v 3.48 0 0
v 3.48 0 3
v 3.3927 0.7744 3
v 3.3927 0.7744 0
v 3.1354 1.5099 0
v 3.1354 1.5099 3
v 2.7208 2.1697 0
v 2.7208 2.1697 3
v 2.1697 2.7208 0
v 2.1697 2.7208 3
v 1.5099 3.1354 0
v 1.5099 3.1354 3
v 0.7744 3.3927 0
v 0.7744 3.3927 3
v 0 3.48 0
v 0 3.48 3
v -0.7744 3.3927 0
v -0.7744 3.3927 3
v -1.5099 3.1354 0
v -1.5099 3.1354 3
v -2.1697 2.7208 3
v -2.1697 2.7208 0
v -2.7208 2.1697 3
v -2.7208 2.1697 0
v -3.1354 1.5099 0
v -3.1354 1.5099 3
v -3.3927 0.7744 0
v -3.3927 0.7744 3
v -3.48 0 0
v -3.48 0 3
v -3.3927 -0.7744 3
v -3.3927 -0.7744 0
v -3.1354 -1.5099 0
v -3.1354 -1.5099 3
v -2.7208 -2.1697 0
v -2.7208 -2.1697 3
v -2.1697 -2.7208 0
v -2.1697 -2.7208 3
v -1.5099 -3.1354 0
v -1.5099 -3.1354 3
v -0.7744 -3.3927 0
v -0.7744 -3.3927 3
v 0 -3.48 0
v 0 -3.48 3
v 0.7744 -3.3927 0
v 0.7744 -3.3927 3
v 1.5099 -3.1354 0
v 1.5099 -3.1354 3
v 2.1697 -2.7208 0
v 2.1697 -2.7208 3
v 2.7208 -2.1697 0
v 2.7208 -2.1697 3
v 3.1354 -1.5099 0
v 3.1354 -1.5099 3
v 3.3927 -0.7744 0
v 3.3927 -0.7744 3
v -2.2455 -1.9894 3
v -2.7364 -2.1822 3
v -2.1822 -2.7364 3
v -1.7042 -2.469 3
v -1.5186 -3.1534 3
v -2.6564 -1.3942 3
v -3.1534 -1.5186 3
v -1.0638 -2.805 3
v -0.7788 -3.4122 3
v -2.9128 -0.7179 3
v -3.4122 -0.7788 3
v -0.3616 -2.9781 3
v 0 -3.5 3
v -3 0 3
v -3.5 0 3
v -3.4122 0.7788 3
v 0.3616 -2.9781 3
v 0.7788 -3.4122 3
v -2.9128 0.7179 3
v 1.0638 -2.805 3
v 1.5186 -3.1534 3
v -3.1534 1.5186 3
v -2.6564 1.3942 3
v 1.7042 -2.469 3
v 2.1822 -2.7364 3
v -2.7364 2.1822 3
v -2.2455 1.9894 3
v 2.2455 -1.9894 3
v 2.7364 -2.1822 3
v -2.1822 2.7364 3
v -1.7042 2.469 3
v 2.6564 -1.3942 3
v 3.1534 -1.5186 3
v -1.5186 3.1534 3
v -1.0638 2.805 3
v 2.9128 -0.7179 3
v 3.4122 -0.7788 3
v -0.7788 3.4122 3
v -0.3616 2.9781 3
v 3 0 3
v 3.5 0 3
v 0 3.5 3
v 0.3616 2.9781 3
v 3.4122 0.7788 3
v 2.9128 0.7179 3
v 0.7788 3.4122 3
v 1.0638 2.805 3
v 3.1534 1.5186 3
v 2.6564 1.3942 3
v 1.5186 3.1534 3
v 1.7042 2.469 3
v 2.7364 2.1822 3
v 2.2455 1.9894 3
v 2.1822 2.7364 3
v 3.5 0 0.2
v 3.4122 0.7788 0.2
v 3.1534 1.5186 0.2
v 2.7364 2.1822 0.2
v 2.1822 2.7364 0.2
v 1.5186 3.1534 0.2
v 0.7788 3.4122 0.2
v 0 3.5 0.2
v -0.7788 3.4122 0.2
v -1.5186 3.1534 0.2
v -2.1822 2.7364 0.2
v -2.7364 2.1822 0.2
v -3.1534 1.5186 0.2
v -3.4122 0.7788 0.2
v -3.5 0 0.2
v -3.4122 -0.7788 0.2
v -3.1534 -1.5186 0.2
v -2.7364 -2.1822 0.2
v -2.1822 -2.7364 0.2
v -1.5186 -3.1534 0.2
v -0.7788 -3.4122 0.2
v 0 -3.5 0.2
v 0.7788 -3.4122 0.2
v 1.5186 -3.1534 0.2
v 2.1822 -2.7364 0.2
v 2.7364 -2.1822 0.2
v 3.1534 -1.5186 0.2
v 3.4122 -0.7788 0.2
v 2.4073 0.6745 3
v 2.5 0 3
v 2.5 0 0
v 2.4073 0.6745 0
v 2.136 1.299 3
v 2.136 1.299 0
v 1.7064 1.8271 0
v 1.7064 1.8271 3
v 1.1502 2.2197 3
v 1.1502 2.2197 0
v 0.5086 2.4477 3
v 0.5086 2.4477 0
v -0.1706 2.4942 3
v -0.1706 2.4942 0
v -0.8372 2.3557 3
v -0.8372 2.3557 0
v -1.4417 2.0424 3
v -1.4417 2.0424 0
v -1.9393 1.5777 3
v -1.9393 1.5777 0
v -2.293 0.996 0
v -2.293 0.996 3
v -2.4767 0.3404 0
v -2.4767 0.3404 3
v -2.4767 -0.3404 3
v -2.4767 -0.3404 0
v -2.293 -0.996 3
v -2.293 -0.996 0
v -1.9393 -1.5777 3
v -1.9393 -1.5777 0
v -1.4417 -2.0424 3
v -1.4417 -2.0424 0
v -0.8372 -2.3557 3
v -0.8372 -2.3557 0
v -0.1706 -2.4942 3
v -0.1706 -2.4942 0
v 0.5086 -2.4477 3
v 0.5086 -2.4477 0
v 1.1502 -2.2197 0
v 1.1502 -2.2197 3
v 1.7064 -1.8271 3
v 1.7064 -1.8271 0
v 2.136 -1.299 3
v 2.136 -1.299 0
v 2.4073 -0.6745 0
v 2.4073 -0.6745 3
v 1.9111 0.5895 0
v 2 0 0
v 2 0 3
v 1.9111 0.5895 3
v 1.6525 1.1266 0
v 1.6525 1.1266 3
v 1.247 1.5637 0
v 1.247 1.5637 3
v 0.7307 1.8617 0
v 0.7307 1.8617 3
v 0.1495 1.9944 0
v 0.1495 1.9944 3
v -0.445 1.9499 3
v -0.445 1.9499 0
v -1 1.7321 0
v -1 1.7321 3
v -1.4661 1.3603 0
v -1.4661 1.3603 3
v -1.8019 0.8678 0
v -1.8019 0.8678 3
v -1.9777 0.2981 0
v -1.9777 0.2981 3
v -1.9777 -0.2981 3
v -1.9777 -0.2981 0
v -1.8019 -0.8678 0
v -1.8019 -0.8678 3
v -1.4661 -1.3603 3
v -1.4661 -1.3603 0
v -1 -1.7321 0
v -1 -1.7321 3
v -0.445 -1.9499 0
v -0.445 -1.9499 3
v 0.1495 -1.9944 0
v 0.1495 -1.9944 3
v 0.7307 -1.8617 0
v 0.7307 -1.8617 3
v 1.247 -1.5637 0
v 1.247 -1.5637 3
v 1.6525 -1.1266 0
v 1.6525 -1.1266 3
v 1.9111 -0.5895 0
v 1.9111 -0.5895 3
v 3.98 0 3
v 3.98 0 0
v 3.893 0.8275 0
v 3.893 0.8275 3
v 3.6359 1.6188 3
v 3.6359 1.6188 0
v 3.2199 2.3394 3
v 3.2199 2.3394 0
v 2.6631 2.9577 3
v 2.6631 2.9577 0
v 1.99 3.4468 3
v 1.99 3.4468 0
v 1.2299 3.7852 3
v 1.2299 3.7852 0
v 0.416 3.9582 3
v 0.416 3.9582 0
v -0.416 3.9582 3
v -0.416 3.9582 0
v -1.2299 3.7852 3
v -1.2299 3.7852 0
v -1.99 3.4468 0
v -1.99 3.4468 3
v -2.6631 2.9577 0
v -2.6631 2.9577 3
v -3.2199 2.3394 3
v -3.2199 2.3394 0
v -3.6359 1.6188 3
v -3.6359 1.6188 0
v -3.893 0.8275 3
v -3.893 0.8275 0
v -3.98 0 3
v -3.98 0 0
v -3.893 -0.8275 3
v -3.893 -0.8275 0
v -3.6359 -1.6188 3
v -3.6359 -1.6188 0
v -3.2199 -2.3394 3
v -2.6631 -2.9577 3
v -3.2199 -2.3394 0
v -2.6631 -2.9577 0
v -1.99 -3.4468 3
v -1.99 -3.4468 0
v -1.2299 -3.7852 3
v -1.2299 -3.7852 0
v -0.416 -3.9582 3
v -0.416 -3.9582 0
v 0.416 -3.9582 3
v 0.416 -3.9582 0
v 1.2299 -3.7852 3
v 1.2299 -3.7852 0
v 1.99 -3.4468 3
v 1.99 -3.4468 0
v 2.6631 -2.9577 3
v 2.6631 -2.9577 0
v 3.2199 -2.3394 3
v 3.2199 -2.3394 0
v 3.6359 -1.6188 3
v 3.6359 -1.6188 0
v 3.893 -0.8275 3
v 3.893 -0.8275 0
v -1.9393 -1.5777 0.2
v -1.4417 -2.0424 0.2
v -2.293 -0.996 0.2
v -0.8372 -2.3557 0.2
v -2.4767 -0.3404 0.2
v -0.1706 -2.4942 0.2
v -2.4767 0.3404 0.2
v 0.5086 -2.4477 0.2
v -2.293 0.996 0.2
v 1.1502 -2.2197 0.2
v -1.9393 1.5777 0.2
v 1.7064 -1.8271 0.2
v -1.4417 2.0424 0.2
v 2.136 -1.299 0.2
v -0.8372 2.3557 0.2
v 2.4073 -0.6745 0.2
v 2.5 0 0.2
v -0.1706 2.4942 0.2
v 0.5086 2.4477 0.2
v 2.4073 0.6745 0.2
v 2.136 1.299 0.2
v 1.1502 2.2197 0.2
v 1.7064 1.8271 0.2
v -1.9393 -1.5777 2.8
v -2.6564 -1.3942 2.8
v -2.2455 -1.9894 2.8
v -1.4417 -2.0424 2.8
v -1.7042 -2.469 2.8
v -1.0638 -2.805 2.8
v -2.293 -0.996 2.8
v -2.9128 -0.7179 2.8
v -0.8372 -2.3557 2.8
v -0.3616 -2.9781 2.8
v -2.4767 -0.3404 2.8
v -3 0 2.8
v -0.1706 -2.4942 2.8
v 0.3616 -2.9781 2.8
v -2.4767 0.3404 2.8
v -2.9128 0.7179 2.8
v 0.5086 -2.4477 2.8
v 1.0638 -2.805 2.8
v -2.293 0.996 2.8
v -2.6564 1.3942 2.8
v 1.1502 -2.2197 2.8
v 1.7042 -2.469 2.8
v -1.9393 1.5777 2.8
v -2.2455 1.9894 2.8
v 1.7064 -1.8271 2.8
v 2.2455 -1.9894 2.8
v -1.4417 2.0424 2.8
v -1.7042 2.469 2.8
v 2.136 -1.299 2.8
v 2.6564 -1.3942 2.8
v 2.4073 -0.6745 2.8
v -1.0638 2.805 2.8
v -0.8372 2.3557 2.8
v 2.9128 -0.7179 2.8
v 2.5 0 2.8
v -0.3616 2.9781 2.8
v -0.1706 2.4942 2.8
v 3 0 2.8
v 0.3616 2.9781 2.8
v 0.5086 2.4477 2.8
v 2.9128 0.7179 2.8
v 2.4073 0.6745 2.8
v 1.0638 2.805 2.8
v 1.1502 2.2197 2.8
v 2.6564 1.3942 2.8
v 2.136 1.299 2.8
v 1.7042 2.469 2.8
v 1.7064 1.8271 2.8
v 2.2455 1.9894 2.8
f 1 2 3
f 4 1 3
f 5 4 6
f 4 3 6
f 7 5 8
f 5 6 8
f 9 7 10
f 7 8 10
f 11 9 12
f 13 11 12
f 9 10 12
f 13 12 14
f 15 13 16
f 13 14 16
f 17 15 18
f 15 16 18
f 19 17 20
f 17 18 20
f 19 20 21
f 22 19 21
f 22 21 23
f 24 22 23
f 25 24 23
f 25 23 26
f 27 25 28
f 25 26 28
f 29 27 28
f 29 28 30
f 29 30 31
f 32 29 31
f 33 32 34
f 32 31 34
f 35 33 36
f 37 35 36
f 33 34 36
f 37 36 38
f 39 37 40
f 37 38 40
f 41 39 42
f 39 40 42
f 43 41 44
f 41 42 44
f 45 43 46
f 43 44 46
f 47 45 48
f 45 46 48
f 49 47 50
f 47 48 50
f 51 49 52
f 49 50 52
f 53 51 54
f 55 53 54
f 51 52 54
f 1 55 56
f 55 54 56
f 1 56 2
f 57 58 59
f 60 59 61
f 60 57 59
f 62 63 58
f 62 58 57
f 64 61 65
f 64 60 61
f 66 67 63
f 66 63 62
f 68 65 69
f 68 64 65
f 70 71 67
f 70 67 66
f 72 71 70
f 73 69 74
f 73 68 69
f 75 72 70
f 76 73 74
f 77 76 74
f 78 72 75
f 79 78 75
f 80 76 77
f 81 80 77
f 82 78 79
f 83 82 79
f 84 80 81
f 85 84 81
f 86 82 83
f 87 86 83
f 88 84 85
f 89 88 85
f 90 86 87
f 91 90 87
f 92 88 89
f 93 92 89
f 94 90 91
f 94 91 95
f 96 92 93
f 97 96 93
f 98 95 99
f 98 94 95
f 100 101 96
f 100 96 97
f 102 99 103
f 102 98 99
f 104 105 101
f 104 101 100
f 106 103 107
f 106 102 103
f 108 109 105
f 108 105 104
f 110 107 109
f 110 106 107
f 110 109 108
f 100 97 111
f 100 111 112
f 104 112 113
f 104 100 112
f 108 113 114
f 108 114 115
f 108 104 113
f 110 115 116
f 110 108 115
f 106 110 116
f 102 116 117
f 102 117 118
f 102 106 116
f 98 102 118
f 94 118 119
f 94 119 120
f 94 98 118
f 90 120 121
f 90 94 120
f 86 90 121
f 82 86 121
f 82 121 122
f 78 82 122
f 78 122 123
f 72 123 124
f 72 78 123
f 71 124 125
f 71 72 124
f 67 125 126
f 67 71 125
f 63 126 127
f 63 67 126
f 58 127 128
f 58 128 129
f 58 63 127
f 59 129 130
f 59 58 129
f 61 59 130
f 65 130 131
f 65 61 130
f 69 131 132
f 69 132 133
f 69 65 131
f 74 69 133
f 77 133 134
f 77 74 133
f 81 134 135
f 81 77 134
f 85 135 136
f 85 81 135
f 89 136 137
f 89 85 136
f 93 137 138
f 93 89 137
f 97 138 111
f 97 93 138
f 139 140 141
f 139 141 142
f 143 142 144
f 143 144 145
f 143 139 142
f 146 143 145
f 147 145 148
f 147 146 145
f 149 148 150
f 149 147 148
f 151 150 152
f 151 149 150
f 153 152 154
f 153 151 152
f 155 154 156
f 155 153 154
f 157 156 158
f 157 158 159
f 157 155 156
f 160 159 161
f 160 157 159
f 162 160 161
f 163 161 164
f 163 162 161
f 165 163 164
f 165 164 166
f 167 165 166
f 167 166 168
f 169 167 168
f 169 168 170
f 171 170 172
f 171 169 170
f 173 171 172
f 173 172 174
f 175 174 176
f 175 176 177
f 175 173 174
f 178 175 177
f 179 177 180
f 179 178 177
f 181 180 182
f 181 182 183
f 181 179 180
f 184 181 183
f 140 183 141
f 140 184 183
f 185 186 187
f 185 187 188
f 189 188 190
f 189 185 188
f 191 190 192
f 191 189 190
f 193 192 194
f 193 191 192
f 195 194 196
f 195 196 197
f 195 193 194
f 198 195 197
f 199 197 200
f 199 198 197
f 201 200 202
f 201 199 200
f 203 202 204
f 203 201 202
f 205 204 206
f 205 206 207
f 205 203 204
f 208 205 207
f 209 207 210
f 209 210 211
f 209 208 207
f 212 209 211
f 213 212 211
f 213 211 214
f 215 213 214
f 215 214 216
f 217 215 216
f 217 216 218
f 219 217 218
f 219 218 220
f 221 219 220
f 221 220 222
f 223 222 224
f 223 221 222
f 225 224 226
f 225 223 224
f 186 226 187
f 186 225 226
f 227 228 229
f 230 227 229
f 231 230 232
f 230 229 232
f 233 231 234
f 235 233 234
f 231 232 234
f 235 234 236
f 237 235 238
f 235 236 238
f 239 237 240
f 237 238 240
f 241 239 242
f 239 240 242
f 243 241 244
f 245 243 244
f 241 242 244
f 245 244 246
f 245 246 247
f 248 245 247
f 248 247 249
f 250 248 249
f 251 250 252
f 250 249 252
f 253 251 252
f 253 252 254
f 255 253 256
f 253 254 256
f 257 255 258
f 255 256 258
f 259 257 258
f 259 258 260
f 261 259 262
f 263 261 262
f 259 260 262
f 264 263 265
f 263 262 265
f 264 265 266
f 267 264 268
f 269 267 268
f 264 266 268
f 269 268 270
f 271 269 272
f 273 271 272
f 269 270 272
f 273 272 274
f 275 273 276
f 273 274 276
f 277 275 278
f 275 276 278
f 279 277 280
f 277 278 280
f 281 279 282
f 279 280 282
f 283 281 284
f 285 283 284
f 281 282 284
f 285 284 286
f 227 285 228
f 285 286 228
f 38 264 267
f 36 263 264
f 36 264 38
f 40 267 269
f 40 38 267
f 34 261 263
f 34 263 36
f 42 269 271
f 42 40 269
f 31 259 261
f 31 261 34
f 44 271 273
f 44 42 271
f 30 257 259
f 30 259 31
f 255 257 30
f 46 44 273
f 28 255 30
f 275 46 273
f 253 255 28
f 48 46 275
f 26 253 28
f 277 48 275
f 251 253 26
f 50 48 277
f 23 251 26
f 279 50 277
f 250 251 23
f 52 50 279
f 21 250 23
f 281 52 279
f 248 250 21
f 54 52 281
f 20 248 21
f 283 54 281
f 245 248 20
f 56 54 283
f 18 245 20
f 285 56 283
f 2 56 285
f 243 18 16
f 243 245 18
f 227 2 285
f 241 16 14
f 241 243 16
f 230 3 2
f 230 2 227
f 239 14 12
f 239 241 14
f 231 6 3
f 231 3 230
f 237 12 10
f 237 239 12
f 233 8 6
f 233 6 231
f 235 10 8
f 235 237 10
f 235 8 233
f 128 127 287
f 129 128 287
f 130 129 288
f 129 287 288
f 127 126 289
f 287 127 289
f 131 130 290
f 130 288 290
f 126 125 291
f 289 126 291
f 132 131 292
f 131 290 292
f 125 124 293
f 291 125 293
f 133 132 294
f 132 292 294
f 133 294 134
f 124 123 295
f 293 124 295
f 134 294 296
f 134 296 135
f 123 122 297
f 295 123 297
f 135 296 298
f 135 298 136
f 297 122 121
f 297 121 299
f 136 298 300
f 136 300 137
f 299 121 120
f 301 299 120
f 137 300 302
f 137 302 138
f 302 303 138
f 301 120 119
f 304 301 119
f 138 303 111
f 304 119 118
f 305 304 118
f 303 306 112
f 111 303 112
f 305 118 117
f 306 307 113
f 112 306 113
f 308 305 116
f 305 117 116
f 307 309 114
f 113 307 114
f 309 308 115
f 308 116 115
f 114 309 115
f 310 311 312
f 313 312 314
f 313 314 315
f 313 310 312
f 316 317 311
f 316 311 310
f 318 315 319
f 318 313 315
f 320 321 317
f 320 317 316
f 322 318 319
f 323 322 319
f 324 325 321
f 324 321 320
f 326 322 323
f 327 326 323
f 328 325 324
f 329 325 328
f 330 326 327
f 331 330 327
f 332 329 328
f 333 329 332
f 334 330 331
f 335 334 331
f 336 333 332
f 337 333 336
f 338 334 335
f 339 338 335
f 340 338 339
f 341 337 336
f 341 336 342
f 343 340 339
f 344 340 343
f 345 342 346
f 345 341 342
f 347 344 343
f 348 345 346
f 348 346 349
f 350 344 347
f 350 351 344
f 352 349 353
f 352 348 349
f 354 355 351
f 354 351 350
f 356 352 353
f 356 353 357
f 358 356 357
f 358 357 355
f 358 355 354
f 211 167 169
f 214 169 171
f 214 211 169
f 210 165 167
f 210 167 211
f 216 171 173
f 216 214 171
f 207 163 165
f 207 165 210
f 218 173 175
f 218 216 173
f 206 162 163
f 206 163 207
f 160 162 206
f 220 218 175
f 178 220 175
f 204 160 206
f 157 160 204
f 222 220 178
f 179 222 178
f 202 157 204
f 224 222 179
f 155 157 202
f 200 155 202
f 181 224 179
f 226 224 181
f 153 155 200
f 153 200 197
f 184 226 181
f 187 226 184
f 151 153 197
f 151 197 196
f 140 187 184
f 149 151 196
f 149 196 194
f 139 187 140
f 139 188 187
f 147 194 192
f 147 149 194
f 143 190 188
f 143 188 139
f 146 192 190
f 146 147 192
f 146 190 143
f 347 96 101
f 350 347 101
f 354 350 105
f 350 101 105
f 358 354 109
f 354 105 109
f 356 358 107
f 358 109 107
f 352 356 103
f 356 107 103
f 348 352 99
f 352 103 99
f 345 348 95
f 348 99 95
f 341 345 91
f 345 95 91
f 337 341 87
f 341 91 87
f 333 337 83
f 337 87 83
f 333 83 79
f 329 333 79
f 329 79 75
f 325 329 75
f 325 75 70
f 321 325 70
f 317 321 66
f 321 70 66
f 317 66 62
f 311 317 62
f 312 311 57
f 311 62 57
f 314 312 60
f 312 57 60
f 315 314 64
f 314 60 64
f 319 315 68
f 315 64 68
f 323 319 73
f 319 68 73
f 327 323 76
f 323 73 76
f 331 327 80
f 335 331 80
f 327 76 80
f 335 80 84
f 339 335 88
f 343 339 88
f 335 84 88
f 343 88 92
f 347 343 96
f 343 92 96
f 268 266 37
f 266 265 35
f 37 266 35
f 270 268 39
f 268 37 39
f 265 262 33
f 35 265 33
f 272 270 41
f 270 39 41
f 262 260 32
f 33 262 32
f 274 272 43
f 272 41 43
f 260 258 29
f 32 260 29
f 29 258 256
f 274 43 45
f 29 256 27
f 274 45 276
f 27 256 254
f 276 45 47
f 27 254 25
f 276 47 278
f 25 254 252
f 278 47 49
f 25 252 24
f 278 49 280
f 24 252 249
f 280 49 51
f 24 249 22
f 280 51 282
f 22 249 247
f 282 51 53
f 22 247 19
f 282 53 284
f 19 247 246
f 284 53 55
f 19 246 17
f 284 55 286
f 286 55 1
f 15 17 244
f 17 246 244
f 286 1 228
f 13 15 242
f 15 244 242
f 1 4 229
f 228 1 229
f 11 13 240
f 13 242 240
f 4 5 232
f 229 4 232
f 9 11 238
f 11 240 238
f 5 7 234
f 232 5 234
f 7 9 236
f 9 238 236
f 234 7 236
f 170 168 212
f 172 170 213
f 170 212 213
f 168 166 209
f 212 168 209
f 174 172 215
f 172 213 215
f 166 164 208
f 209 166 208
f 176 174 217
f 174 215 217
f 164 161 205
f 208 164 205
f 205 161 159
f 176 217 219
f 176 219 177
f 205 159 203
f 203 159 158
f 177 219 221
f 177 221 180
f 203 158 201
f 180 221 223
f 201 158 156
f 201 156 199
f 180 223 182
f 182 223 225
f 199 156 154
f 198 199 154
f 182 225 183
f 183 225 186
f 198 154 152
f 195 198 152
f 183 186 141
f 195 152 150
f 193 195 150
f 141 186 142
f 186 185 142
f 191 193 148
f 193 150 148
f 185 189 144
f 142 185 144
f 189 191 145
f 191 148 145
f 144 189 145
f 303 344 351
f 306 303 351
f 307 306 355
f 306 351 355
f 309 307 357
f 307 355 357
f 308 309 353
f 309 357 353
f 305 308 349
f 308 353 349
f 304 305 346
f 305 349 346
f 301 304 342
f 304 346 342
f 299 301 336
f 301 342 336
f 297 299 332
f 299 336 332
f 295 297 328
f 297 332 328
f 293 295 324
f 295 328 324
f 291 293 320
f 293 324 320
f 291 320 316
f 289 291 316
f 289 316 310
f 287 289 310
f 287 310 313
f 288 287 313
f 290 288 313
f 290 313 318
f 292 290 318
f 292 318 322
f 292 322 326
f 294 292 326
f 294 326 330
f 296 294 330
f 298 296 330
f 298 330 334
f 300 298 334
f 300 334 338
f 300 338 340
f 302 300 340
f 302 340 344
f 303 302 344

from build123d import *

# Parameters (mm, degrees)
SKETCH1_R           = 3.98
SKETCH1_R_2         = 2
BOSS_EXTRUDE1_DEPTH = 3
SKETCH2_R           = 3.48
SKETCH2_R_2         = 2.5
CUT_EXTRUDE1_DEPTH  = 3
SKETCH3_R           = 3.5
SKETCH3_R_2         = 2.5
BOSS_EXTRUDE3_DEPTH = 2.8
SKETCH4_R           = 3
SKETCH4_R_2         = 2
CUT_EXTRUDE2_DEPTH  = 0.2


with BuildPart() as part:
    # Sketch1 → Boss-Extrude1 (new body)
    with BuildSketch(Plane.XY):
        Circle(SKETCH1_R)
        Circle(SKETCH1_R_2, mode=Mode.SUBTRACT)
    extrude(amount=BOSS_EXTRUDE1_DEPTH)

    # Sketch2 → Cut-Extrude1 (cut)
    with BuildSketch(Plane.XY.offset(3)):
        Circle(SKETCH2_R)
        Circle(SKETCH2_R_2, mode=Mode.SUBTRACT)
    extrude(amount=-CUT_EXTRUDE1_DEPTH, mode=Mode.SUBTRACT)


with BuildPart() as body_2:
    # Sketch3 → Boss-Extrude3 (new body)
    with BuildSketch(Plane.XY.offset(3)):
        Circle(SKETCH3_R)
        Circle(SKETCH3_R_2, mode=Mode.SUBTRACT)
    extrude(amount=-BOSS_EXTRUDE3_DEPTH)

    # Sketch4 → Cut-Extrude2 (cut)
    with BuildSketch(Plane.XY.offset(3)):
        Circle(SKETCH4_R)
        Circle(SKETCH4_R_2, mode=Mode.SUBTRACT)
    extrude(amount=-CUT_EXTRUDE2_DEPTH, mode=Mode.SUBTRACT)


solid = Compound([part.part, body_2.part])
